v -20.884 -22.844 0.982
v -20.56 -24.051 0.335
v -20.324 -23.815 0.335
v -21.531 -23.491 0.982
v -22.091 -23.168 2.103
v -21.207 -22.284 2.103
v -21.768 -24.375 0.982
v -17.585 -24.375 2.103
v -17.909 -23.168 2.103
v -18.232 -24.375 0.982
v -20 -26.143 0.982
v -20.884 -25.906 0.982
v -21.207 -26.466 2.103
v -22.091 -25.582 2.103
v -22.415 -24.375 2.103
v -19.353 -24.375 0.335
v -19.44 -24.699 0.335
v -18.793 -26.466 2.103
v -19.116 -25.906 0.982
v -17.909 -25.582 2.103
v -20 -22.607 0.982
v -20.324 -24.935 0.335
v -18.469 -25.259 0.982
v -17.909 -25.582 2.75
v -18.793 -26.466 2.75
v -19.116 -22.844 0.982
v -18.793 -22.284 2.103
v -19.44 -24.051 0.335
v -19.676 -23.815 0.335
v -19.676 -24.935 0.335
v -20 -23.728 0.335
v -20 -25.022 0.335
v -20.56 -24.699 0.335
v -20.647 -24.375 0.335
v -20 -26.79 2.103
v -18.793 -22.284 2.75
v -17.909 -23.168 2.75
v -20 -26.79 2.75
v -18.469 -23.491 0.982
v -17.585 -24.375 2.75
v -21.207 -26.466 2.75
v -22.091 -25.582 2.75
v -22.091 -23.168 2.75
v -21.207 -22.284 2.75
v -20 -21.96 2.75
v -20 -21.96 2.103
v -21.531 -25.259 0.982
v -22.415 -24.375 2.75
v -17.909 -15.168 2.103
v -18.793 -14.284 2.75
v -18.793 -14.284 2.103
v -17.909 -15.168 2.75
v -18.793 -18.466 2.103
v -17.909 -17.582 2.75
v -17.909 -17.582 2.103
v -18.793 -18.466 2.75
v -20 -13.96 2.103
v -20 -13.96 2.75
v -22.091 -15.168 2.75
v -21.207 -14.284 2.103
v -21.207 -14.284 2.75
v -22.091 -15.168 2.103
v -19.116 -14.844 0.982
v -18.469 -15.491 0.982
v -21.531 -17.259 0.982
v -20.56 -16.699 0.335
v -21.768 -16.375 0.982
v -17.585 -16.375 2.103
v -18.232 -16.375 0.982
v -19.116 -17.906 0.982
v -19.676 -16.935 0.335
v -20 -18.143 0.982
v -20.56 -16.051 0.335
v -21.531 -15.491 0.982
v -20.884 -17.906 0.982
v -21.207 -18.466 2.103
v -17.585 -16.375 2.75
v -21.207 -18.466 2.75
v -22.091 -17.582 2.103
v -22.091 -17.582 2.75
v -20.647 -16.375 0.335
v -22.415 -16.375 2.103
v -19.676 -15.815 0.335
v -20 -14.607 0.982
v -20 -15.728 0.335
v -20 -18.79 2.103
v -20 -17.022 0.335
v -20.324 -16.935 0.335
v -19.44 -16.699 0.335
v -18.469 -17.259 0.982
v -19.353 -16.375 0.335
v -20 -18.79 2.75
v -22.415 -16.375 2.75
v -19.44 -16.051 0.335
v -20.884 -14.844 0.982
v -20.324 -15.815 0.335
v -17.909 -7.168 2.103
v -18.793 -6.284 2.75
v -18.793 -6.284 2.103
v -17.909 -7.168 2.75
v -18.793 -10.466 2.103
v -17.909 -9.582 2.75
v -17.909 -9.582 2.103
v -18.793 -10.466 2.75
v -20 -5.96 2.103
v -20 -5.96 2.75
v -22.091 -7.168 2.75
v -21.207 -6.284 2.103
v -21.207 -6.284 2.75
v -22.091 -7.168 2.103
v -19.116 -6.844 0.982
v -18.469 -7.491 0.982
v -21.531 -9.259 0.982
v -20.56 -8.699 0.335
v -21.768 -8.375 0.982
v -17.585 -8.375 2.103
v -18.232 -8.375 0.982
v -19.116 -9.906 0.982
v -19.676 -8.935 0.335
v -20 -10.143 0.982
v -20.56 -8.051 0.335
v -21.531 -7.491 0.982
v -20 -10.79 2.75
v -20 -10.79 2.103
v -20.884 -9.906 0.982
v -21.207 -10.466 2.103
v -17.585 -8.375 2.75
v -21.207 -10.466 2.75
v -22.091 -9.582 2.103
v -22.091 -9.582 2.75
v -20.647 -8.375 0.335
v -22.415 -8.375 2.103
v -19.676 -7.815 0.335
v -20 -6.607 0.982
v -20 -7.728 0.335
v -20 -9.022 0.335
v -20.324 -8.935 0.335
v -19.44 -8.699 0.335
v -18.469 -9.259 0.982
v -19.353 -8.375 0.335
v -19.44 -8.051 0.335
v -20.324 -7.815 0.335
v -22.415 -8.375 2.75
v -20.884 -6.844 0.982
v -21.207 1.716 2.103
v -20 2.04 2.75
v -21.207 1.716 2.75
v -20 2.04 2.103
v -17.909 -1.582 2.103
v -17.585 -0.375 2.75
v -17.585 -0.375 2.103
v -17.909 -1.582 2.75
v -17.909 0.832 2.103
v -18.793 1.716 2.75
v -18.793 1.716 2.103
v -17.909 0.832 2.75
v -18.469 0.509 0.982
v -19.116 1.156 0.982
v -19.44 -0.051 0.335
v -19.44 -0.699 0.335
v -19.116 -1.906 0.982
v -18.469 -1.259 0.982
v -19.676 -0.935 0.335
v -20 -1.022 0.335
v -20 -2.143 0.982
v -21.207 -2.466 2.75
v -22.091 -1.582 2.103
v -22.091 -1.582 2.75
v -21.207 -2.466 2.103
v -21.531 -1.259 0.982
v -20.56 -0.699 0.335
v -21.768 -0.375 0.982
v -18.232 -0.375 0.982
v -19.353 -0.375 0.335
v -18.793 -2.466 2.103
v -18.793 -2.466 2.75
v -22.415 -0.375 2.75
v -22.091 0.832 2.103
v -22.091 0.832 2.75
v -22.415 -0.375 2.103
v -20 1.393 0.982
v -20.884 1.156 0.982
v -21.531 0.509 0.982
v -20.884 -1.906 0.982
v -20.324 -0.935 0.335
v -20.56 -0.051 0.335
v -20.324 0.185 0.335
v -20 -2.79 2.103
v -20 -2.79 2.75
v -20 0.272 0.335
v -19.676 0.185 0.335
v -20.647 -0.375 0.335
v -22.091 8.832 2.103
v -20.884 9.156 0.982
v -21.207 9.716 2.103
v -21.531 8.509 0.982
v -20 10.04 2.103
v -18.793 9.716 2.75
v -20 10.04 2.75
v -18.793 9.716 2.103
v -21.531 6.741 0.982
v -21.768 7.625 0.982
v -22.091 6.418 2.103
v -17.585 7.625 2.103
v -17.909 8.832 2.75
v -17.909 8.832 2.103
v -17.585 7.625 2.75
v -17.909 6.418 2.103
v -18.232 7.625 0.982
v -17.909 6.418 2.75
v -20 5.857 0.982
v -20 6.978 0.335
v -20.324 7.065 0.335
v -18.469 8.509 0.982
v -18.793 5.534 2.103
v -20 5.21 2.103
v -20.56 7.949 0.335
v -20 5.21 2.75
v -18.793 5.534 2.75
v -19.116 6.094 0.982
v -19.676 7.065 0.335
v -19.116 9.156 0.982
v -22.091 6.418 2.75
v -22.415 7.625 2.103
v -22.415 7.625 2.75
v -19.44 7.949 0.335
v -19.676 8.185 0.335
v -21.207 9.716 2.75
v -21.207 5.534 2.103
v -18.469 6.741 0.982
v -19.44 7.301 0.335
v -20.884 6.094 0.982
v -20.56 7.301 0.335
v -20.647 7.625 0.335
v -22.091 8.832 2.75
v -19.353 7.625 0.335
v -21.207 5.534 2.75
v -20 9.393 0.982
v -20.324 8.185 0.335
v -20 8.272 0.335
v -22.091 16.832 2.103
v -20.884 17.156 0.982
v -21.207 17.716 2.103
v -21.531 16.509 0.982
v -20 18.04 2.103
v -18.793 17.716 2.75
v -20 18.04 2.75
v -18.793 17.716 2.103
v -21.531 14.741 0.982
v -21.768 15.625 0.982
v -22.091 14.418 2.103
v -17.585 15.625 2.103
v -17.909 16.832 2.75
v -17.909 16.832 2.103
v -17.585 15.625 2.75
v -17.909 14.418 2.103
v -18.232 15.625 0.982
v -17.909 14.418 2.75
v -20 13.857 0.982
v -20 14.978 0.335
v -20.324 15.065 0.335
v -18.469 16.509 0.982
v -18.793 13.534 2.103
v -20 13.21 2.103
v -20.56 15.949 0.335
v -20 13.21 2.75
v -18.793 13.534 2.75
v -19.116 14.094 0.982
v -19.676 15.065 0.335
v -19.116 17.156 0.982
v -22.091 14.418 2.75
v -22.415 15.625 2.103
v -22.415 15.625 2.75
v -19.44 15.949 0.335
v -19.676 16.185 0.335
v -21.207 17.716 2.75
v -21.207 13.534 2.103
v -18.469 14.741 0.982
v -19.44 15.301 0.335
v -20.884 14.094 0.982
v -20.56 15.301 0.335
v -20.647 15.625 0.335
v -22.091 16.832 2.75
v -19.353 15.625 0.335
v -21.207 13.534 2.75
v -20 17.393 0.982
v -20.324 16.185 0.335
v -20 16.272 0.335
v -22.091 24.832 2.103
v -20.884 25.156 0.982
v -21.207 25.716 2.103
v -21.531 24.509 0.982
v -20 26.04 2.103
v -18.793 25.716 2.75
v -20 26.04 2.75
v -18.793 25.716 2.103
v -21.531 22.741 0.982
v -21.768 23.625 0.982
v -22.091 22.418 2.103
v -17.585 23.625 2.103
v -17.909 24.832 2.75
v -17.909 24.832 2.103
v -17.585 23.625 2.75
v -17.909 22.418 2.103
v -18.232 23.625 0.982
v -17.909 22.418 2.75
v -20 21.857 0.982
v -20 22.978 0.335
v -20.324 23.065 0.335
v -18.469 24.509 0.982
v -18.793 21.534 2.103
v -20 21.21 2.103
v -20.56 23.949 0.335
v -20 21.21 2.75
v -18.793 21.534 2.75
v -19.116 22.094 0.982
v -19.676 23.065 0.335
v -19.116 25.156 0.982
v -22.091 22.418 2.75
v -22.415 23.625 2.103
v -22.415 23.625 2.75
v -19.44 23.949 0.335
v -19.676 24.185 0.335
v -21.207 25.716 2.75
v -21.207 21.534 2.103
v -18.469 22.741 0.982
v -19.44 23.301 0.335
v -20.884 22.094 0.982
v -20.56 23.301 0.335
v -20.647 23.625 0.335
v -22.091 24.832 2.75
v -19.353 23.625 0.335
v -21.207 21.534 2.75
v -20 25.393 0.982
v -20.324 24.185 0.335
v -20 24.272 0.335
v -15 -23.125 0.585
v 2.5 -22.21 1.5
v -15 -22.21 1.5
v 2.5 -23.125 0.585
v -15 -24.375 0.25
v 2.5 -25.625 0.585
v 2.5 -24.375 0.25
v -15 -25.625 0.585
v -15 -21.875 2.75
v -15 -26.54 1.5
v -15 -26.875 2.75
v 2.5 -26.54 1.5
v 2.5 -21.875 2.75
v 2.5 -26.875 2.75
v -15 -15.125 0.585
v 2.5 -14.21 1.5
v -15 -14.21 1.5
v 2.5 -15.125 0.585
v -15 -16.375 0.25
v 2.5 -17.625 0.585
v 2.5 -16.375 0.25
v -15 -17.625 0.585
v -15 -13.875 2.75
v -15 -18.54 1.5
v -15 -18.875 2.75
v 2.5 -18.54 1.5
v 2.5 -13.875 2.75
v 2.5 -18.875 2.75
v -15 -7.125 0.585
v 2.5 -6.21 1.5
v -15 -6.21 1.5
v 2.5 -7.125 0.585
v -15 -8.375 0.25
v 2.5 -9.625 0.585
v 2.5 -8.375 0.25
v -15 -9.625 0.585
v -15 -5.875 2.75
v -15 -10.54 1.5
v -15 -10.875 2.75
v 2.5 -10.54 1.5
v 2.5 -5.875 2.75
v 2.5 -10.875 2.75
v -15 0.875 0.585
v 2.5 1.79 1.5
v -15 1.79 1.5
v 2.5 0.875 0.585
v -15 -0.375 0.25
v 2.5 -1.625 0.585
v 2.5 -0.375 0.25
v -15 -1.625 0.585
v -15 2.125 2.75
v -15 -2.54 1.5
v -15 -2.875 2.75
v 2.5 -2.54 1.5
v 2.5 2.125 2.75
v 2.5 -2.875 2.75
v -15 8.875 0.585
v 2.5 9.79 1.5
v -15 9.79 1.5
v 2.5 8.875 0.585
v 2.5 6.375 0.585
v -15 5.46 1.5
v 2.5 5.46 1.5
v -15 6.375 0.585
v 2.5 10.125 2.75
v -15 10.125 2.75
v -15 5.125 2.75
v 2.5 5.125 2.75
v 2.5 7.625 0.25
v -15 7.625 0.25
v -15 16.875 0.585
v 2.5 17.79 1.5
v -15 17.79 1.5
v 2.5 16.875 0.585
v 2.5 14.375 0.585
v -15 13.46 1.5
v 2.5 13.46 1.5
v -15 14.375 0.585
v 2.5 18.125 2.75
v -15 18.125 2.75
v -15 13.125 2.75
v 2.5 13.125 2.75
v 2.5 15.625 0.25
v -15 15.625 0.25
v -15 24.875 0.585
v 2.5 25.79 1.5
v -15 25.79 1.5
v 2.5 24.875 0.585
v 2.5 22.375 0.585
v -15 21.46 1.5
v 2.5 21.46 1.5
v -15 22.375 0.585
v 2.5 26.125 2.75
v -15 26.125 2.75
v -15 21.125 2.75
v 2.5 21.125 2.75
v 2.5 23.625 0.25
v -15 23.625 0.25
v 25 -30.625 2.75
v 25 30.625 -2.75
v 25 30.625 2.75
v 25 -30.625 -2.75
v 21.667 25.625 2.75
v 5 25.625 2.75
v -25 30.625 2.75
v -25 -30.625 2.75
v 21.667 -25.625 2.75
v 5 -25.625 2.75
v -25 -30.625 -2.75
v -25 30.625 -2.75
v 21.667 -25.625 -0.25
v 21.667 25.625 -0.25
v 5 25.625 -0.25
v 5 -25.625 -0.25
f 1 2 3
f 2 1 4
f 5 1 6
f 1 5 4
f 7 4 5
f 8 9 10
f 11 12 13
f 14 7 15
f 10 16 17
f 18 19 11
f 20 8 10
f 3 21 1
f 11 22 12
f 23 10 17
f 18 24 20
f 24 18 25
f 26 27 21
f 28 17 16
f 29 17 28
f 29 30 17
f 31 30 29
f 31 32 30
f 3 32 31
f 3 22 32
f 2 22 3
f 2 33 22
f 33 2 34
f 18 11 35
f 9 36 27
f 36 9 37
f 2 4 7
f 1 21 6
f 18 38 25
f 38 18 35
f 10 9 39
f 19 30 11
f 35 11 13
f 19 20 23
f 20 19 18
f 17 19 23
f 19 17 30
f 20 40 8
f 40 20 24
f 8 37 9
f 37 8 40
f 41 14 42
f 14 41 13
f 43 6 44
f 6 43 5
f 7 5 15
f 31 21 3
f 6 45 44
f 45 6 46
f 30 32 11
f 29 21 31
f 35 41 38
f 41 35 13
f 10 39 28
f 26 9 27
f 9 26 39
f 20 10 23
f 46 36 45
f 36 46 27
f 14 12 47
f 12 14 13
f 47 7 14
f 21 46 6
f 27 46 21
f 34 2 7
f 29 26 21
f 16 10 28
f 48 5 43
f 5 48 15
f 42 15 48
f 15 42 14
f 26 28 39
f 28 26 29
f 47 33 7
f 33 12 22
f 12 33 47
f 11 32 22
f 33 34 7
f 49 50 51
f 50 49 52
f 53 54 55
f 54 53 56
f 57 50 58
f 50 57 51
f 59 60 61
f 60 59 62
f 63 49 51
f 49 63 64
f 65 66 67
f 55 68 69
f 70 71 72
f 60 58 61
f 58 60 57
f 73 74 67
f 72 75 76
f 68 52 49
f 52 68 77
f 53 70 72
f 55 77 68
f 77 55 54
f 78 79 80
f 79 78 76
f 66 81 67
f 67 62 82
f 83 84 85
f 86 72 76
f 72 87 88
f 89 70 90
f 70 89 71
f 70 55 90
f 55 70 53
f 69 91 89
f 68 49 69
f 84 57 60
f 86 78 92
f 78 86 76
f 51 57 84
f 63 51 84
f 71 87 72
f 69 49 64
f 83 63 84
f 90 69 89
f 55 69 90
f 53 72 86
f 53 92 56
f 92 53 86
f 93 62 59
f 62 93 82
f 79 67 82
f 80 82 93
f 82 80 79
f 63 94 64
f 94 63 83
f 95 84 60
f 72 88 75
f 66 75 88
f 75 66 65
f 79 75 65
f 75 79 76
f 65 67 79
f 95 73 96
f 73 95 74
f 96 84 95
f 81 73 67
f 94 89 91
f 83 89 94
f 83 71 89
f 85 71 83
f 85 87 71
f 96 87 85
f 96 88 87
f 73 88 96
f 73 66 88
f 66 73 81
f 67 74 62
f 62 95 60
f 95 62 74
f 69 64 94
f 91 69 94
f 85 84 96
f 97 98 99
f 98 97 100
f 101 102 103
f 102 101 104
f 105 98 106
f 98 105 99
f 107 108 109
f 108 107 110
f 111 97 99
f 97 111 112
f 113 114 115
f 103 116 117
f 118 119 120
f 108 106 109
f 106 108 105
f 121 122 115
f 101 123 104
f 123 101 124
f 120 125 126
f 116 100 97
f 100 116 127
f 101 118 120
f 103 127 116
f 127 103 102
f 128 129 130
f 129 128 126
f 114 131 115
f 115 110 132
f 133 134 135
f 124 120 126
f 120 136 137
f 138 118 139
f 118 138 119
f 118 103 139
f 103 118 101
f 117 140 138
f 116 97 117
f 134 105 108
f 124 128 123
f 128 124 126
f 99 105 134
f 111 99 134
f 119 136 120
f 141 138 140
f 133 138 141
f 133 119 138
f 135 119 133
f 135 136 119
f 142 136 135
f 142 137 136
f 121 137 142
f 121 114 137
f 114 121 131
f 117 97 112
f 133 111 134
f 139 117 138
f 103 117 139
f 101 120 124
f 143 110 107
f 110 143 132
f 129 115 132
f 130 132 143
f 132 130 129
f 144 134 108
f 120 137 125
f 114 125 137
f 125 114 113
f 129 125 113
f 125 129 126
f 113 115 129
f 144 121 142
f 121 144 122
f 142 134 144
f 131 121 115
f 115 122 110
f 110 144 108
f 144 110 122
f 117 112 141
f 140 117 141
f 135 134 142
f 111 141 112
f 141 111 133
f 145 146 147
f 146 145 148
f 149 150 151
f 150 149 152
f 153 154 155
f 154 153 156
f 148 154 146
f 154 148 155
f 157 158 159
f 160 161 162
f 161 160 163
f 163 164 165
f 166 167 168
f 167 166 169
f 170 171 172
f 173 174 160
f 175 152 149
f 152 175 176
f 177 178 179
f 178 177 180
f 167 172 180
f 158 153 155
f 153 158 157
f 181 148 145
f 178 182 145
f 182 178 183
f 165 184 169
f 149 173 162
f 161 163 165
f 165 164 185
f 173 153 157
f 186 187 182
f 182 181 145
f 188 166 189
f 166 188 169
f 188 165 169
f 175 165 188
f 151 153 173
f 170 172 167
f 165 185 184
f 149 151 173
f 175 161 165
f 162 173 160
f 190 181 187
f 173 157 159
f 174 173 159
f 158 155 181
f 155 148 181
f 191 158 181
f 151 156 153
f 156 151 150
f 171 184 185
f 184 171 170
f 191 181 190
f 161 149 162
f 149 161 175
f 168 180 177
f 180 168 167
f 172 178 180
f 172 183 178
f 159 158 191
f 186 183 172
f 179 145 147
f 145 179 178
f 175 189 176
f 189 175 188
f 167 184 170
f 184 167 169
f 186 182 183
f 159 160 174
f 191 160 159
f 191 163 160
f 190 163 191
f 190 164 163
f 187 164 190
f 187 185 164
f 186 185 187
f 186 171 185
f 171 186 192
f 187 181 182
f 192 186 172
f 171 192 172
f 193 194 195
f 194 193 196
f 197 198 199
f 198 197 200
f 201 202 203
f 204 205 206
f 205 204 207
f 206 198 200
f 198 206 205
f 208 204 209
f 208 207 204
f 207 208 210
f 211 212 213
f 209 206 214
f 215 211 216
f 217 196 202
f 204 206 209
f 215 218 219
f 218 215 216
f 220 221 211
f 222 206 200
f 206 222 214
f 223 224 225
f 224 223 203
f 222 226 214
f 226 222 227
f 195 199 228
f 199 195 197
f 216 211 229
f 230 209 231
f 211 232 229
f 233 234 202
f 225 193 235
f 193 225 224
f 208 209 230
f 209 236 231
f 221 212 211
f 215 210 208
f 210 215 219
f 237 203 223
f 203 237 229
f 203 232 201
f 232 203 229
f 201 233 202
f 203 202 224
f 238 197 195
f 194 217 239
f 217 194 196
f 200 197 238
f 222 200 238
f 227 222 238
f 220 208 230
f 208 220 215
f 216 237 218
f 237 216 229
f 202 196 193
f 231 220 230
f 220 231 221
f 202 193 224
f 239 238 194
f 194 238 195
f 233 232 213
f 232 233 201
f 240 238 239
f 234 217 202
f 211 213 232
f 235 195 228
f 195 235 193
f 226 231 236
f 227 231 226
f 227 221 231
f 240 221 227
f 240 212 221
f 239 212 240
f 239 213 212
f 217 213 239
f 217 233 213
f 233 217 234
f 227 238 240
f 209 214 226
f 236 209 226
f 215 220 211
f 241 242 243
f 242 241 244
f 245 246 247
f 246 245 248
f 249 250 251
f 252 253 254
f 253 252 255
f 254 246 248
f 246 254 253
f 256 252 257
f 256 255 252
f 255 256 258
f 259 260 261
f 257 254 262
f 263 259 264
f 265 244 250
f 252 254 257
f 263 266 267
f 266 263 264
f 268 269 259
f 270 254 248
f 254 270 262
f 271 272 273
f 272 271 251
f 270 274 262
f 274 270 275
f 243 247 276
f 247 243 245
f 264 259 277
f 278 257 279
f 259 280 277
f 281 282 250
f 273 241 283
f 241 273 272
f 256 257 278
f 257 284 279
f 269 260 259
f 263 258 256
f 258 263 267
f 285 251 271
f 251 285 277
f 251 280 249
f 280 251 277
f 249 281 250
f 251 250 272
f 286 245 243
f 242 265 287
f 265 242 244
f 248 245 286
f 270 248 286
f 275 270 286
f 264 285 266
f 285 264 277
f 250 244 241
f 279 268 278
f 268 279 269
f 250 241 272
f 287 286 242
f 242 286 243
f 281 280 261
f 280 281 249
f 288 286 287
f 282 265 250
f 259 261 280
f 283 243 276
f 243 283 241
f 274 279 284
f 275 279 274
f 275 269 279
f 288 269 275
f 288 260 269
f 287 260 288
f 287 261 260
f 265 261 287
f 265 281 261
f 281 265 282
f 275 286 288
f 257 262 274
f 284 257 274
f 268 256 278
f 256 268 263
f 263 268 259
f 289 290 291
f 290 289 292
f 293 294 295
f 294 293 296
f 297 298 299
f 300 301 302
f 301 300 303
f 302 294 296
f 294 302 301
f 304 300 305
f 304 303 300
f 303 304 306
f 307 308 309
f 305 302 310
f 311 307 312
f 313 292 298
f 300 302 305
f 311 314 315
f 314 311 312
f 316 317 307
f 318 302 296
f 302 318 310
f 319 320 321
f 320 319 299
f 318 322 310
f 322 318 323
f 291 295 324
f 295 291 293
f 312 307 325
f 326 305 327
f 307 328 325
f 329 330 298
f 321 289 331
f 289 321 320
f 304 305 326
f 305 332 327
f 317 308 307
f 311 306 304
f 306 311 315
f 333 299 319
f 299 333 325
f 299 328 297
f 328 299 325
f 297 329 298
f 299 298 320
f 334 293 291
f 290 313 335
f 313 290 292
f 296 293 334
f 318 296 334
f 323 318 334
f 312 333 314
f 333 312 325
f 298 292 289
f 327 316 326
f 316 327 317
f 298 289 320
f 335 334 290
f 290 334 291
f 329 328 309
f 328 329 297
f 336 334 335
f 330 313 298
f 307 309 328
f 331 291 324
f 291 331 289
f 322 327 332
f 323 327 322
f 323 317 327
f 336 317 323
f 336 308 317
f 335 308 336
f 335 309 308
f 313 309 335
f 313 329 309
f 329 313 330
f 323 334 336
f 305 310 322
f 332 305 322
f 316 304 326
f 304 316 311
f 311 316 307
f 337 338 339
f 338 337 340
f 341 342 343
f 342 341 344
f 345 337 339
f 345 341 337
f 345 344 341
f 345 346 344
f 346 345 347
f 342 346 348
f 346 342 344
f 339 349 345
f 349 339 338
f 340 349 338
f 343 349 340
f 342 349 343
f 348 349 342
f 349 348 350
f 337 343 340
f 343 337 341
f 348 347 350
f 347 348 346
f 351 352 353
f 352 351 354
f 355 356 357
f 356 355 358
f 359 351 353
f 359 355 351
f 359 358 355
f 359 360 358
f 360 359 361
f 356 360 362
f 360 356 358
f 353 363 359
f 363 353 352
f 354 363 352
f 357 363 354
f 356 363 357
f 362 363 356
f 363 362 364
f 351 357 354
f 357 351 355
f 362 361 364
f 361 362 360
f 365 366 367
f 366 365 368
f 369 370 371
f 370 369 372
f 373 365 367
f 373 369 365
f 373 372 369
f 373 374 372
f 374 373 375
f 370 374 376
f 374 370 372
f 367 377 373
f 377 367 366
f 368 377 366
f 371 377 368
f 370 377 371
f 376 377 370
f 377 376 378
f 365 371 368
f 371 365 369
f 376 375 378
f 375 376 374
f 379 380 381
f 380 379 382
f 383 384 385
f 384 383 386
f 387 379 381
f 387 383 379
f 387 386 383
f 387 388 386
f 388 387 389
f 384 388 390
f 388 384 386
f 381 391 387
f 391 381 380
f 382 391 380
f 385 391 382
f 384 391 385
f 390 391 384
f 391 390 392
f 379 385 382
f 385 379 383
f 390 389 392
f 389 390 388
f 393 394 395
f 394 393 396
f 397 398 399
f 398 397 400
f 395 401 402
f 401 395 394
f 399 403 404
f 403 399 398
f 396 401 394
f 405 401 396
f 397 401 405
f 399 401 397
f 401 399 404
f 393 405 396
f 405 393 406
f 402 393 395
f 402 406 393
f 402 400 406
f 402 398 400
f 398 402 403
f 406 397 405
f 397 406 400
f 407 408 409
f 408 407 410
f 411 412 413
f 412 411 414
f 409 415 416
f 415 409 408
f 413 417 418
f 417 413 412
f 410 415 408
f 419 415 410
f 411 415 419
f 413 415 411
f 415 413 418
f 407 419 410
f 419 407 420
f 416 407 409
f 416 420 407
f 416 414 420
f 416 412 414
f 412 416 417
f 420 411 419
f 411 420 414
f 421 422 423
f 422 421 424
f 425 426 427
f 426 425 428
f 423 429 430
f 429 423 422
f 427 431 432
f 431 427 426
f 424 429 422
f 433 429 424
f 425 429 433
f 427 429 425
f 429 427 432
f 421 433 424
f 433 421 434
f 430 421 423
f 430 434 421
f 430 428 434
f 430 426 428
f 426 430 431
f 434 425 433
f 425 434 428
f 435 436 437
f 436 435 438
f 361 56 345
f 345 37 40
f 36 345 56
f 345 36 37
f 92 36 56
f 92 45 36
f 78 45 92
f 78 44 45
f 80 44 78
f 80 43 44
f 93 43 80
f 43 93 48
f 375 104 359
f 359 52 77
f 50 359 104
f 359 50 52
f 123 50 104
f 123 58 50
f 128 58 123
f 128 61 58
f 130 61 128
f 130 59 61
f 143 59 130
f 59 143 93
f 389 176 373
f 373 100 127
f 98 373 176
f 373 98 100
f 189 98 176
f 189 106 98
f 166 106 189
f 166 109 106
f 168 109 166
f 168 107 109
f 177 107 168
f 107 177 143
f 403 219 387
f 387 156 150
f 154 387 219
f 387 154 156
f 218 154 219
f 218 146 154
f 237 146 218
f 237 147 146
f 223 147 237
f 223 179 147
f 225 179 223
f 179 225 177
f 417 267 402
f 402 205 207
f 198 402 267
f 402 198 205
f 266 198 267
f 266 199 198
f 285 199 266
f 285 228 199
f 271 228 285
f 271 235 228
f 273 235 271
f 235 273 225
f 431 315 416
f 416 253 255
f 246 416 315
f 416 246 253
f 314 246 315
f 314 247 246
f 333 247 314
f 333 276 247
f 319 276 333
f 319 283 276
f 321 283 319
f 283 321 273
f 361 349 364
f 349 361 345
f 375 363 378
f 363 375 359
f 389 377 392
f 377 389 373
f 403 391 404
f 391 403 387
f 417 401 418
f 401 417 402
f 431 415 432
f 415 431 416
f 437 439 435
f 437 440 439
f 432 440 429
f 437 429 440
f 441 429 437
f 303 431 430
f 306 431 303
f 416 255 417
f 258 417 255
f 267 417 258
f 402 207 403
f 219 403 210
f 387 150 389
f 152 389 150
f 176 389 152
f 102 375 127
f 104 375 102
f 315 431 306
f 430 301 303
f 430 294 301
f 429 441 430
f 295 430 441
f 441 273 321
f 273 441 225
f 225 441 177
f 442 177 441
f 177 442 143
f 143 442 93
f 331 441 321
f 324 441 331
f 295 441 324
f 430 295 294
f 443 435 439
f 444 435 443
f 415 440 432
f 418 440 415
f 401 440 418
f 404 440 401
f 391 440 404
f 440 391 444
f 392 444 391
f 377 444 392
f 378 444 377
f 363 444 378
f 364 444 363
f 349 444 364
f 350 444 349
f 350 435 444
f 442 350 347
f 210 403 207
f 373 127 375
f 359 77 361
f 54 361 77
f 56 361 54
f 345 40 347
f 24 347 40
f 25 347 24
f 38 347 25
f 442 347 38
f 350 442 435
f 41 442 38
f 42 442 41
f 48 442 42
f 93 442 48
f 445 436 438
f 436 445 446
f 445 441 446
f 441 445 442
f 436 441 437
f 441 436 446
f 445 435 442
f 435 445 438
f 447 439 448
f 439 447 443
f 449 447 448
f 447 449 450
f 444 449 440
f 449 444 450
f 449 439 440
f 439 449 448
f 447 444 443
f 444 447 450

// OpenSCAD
pins = 7;
pin_width=5;
tray_width=1.75*pin_width*pins;
tray_height=5.5;
tray_length=pin_width*10;

difference() {
cube([tray_length,tray_width,tray_height], center=true);
    {
        union() {
for (i = [0:1:pins-1])
    translate(  [   pin_width-tray_length/2,
                    1.25*pin_width+i*pin_width*1.6-tray_width/2,
                    tray_height/2
                ] ) 
        sphere(r=pin_width/2, $fn=12);

for (i = [0:1:pins-1])
    translate(  [   pin_width*2-tray_length/2,
                    1.25*pin_width+i*pin_width*1.6-tray_width/2,
                    tray_height/2
                ] ) rotate([90,0,90]) cylinder(r=pin_width/2, h=pin_width*3.5, $fn=12);
}

translate([pin_width+tray_length/6,0,pin_width/2]) cube([tray_length/3,tray_width-pin_width*2,tray_height], center=true);
}
}
